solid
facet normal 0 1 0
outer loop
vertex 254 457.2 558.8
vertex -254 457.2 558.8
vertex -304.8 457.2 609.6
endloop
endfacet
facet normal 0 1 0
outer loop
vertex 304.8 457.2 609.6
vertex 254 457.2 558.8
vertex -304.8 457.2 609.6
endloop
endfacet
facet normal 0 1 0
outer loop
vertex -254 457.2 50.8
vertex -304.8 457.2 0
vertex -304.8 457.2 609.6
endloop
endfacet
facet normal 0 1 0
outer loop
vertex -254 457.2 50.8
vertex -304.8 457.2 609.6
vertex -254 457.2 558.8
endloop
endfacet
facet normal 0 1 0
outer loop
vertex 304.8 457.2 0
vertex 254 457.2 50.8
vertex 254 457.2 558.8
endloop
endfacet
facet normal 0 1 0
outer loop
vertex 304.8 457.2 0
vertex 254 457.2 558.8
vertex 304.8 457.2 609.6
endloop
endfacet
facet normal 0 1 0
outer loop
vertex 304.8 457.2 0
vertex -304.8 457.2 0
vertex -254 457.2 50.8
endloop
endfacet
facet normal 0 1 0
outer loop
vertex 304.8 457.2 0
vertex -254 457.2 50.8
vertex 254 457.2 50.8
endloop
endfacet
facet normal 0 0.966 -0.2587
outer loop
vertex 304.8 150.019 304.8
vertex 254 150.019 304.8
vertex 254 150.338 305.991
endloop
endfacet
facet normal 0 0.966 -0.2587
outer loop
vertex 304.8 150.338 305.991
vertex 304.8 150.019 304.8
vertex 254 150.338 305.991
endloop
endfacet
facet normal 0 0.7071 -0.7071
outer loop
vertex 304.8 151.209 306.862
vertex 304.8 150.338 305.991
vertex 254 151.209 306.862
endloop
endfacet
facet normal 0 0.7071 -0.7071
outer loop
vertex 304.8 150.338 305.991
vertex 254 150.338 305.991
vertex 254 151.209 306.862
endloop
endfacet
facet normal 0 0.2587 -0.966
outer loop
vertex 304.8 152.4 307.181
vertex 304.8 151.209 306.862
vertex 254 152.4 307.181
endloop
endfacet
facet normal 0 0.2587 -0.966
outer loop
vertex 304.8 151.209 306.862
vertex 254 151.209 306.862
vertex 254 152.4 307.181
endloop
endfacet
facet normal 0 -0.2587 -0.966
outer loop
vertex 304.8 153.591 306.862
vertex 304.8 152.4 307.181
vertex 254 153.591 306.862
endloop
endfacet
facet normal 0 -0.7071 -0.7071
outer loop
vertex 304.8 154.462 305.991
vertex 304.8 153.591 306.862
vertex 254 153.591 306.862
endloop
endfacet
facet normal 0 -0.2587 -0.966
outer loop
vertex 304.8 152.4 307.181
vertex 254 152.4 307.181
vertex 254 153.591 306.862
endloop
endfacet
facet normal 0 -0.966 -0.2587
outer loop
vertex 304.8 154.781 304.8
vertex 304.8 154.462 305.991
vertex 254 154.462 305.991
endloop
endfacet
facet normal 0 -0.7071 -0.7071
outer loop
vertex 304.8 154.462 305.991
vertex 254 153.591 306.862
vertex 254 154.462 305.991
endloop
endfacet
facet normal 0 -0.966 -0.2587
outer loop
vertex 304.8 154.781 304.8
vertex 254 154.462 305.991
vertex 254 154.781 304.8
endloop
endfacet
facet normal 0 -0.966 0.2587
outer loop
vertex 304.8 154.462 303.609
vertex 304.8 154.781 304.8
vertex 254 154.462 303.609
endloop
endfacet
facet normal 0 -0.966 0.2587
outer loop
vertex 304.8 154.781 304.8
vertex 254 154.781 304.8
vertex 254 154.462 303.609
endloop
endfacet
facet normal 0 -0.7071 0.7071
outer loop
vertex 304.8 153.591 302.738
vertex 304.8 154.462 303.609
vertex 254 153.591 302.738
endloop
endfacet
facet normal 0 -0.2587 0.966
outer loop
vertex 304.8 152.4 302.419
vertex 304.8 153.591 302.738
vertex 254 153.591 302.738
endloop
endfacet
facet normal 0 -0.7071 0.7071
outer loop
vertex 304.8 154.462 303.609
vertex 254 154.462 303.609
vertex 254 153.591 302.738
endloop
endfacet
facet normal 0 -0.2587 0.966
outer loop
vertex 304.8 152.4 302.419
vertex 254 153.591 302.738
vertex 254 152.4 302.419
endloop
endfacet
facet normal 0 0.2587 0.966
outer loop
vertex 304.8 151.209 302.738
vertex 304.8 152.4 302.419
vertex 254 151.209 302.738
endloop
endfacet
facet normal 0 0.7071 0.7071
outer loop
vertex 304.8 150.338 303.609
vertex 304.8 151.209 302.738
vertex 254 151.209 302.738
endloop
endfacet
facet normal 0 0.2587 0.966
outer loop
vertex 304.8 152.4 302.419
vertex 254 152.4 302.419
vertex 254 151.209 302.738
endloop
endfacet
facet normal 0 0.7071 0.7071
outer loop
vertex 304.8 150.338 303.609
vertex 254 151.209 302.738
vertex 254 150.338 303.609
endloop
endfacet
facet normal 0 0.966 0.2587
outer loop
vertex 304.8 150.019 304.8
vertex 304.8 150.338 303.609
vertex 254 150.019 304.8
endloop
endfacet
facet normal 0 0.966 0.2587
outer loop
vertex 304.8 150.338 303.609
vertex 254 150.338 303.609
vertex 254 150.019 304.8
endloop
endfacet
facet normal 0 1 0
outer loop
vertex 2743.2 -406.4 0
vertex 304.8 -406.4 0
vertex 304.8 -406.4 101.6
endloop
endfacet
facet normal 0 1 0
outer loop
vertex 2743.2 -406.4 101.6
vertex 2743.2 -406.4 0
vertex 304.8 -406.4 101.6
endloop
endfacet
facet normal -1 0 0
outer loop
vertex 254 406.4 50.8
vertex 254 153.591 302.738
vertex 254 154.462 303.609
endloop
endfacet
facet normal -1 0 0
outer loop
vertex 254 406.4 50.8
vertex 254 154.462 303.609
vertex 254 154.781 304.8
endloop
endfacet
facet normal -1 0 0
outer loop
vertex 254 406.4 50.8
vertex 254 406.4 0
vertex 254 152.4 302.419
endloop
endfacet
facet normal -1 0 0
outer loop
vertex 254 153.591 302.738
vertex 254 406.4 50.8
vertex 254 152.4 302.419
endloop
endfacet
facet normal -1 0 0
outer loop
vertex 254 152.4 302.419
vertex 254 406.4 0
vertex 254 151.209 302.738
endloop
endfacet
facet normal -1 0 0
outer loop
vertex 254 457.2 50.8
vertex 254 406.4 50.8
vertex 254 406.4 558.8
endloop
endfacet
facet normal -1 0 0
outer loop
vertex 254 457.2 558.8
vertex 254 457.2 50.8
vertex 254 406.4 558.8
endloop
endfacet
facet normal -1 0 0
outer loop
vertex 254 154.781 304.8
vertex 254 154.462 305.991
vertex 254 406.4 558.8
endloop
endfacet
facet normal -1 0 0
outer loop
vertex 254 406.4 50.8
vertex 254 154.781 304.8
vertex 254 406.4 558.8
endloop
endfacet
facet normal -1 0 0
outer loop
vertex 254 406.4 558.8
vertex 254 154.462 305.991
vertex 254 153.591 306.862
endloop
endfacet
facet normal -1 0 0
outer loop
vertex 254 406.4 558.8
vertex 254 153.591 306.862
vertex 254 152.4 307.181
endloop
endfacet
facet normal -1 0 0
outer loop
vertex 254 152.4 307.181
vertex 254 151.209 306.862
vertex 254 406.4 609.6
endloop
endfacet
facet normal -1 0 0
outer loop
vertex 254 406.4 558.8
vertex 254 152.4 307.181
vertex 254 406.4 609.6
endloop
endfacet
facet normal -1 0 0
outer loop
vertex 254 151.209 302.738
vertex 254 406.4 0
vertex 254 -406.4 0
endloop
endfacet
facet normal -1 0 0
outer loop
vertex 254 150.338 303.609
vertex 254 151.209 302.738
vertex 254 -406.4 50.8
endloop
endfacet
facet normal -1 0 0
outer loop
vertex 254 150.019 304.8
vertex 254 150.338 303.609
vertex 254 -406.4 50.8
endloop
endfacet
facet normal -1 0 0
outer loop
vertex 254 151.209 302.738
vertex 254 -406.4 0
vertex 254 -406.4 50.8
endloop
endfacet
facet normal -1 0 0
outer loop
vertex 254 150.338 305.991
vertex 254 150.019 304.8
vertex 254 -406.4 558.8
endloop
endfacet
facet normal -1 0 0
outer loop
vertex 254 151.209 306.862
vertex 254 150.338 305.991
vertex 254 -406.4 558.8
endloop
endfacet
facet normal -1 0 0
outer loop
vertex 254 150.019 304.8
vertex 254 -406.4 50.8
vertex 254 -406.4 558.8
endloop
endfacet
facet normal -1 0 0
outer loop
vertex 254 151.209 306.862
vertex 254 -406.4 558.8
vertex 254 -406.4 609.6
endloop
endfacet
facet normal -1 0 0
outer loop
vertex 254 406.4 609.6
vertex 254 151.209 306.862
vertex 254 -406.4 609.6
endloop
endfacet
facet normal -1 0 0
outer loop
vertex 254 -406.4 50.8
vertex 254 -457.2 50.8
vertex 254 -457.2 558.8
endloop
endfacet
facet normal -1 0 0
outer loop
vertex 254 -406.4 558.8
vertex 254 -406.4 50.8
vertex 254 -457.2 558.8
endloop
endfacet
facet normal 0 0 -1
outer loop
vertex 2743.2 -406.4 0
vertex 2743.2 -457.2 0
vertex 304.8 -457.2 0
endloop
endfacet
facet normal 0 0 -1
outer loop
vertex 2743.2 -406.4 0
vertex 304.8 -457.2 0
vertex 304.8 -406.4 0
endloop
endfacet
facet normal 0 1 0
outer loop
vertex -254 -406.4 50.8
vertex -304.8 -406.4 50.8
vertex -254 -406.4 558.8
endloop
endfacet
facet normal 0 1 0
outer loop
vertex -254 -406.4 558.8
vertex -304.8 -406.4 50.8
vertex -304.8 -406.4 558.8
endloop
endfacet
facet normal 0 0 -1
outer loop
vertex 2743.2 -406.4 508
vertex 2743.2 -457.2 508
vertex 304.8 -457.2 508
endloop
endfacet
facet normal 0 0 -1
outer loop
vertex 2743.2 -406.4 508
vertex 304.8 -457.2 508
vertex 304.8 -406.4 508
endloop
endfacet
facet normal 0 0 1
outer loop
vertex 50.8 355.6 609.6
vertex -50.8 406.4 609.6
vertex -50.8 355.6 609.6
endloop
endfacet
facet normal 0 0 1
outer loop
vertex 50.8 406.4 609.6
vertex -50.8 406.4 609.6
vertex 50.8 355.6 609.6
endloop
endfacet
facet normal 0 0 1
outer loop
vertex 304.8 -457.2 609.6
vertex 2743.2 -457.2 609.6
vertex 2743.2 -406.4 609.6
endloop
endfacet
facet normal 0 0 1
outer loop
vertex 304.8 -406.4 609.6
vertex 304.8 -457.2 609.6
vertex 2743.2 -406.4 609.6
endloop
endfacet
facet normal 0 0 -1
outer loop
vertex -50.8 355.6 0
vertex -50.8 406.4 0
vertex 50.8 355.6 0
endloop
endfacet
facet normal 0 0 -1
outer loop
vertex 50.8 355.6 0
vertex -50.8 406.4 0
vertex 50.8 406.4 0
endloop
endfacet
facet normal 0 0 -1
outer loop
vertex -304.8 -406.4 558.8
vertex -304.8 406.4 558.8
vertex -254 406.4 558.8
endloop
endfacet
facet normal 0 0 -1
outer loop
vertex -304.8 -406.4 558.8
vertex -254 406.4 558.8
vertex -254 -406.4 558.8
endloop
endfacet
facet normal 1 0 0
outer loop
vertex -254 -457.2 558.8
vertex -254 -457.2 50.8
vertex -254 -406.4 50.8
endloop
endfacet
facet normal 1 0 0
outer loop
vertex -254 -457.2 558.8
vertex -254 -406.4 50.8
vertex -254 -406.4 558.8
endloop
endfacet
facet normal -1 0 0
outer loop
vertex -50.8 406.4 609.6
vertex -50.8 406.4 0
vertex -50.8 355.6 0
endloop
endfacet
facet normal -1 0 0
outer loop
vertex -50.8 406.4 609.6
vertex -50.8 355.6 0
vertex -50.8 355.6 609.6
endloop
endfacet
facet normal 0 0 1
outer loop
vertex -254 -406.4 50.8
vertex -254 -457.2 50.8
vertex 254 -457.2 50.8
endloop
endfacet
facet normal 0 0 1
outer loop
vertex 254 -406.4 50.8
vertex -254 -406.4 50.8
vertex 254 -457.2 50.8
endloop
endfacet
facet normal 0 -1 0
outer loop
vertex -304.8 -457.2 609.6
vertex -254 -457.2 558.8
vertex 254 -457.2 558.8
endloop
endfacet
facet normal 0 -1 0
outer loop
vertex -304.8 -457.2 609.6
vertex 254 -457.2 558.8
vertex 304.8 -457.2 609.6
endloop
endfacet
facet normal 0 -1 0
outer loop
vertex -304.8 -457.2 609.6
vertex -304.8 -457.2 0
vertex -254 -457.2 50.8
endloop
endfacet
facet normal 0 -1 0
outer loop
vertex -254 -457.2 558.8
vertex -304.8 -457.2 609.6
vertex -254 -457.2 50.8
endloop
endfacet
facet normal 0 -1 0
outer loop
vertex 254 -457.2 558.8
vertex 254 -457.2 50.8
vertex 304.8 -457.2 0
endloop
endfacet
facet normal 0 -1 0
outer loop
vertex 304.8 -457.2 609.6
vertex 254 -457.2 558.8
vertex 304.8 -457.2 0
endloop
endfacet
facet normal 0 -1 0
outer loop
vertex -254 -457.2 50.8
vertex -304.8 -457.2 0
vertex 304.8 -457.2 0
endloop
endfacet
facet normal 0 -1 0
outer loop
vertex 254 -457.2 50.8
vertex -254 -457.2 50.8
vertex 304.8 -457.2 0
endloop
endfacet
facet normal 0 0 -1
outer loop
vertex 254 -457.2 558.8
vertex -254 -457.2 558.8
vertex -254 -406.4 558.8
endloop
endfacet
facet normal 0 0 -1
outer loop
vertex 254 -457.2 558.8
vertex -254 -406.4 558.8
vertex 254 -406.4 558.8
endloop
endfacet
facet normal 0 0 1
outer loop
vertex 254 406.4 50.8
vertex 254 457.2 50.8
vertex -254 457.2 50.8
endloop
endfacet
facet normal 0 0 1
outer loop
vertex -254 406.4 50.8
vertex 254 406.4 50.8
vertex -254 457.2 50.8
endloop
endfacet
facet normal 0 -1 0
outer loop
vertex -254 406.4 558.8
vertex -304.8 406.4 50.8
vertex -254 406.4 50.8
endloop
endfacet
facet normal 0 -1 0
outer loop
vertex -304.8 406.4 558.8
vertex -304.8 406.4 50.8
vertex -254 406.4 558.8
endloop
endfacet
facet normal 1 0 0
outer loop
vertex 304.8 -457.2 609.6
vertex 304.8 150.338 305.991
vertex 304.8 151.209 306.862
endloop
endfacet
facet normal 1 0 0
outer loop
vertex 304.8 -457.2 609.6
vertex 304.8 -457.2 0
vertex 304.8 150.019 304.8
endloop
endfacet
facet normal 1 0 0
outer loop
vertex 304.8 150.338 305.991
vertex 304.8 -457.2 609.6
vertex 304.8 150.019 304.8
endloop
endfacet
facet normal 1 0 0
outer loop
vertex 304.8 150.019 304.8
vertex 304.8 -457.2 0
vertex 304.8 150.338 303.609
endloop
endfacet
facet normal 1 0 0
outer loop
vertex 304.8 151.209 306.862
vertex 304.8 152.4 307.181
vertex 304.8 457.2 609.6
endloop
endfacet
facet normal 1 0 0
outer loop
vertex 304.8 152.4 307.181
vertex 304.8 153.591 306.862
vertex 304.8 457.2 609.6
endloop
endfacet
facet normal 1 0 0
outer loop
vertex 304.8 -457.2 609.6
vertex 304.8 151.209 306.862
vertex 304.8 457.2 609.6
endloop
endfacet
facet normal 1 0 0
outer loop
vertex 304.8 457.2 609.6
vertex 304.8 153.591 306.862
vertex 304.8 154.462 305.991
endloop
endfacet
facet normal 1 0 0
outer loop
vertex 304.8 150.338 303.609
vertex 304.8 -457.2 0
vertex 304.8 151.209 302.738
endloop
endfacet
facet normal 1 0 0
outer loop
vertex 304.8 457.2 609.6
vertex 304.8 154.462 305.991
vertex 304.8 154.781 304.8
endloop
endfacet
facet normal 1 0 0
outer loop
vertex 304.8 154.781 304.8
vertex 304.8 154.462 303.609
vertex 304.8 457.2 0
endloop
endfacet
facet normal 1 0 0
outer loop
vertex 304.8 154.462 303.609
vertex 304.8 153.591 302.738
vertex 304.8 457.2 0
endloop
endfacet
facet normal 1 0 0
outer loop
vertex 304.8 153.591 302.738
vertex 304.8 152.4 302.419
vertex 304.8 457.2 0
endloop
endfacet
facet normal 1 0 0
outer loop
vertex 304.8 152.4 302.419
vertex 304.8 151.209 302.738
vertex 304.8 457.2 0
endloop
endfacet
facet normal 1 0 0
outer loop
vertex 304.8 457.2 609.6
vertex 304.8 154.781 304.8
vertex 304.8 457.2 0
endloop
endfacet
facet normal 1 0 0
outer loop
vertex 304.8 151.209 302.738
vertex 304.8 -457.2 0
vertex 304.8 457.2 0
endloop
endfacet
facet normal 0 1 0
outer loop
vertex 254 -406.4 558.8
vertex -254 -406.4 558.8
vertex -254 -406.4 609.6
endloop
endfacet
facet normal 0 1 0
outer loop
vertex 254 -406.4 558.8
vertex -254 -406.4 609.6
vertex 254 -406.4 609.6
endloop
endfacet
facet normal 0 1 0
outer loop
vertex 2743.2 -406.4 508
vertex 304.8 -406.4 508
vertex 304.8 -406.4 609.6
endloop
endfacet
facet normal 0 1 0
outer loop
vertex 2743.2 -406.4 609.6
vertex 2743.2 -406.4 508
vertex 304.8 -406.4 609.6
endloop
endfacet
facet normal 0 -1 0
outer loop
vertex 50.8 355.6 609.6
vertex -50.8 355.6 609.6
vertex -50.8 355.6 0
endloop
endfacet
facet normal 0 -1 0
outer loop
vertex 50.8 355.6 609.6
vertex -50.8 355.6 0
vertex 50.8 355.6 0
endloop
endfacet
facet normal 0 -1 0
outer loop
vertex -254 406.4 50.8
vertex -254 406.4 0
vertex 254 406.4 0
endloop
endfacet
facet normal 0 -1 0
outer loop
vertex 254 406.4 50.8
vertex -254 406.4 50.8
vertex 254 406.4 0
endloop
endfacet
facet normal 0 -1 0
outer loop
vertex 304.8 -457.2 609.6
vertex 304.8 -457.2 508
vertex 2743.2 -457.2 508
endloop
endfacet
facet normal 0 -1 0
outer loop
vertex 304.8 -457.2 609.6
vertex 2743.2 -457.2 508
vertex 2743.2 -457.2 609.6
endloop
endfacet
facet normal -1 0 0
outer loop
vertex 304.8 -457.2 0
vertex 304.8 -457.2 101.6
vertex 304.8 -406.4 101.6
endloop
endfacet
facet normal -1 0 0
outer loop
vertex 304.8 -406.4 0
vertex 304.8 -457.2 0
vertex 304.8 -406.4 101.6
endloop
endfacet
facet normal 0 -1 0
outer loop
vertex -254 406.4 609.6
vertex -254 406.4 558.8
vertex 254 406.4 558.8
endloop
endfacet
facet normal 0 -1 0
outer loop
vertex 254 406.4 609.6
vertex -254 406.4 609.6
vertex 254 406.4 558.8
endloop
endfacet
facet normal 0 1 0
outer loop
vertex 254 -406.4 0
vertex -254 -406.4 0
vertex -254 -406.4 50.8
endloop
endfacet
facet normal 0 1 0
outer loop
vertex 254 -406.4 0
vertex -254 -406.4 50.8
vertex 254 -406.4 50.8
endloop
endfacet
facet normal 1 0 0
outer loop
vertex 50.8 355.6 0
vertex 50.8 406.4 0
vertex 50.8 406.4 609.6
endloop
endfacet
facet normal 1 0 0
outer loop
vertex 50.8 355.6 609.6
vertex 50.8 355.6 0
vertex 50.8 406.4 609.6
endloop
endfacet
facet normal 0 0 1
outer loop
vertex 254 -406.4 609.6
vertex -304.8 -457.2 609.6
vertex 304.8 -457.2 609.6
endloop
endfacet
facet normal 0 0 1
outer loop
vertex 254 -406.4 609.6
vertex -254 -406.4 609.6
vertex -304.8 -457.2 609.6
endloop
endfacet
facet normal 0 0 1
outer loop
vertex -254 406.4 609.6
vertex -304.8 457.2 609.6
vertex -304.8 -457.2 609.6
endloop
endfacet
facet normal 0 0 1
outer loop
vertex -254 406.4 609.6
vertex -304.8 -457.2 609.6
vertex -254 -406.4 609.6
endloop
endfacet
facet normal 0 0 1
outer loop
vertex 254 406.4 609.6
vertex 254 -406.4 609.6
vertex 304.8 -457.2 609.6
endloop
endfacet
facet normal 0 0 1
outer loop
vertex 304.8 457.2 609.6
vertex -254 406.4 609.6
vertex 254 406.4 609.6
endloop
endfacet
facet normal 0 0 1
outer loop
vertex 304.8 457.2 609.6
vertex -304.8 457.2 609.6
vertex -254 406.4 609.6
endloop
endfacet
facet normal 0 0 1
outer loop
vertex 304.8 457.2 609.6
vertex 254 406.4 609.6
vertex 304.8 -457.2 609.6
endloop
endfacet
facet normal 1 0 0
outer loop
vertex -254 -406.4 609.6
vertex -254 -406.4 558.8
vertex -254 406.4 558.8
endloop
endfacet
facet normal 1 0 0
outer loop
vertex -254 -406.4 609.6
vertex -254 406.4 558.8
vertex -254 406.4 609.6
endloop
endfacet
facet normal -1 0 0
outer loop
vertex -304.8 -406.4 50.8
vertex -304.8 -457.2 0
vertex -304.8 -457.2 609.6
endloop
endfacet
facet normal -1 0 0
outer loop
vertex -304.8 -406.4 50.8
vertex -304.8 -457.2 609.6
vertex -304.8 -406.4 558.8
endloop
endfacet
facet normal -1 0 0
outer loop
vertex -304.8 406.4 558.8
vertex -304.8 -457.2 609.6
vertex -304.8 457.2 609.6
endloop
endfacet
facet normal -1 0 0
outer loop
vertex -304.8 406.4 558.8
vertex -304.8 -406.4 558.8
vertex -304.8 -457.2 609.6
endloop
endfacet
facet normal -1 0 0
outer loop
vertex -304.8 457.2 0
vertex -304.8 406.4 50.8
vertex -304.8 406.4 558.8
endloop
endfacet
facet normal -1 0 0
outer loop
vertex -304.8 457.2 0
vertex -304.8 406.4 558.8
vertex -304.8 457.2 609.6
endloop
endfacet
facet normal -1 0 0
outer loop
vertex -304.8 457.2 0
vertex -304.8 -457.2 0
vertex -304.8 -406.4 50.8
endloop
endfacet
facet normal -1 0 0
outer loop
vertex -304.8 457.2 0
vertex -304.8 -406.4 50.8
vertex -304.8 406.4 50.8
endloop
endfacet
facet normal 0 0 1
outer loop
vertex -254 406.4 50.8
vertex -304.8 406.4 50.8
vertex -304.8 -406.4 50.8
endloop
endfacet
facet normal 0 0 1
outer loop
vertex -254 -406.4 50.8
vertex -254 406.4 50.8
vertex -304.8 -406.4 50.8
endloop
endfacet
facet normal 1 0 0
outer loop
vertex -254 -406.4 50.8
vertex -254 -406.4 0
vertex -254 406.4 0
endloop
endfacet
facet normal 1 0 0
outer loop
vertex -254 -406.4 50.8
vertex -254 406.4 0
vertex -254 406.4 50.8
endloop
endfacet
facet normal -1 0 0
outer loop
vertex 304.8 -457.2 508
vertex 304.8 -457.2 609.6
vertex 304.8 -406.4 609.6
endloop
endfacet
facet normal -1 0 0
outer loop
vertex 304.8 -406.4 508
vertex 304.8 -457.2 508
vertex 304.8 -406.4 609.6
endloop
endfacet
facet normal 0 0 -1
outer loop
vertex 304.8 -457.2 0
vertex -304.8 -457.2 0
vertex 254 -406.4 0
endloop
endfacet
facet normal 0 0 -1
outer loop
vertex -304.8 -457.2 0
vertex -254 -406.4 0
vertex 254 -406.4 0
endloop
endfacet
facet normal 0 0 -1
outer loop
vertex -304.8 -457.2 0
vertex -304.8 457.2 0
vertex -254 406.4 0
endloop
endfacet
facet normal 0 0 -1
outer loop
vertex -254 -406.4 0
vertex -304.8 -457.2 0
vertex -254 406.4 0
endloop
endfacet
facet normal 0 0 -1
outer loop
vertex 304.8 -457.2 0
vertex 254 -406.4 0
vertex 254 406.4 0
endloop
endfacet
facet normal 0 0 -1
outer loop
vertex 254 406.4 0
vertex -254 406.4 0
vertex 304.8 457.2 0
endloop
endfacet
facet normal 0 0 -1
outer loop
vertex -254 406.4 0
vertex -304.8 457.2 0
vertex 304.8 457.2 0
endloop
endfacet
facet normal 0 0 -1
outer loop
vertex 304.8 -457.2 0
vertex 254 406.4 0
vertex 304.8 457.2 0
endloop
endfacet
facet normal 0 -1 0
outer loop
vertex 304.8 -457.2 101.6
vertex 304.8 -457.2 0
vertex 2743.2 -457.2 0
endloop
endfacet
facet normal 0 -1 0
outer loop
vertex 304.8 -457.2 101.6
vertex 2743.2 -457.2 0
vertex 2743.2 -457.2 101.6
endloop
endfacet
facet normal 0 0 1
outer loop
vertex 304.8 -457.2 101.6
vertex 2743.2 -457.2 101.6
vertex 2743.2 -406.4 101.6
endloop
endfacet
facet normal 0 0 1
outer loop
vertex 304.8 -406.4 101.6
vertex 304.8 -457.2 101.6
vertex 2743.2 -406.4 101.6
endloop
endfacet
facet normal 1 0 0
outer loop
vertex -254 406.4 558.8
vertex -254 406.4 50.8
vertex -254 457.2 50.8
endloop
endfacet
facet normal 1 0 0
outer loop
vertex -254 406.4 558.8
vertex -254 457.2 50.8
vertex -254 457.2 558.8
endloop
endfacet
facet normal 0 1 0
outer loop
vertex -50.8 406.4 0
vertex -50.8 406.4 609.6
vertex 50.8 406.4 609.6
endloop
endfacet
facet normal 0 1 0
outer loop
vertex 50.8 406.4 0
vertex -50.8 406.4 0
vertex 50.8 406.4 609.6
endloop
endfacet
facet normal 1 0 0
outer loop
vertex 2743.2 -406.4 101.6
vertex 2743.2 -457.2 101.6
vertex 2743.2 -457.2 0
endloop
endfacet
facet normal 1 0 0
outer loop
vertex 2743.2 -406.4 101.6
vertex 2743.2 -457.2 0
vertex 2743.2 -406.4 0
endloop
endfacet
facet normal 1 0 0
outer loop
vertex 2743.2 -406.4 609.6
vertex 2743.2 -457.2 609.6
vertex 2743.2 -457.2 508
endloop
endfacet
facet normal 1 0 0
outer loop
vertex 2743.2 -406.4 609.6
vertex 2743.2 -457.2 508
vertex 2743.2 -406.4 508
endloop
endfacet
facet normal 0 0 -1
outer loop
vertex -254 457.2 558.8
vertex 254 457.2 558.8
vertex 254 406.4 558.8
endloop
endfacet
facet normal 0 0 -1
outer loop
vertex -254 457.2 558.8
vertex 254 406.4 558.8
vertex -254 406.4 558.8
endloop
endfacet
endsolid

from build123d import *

# Parameters (mm, degrees)
F0_W      = 609.6
F0_H      = 914.4
F0_W_2    = 508
F0_H_2    = 812.8
F1_DEPTH  = 609.6
F2_W      = 508
F2_H      = 508
F3_DEPTH  = 50.8
F4_W      = 508
F4_H      = 508
F5_DEPTH  = 50.8
F6_W      = 812.8
F6_H      = 508
F7_DEPTH  = 50.8
F8_W      = 50.8
F8_H      = 101.6
F9_DEPTH  = 2438.4
F10_D     = 4.7625
F11_W     = 101.6
F11_H     = 609.6
F12_DEPTH = 50.8


with BuildPart() as f1:
    # F0 (on Top) → F1 (new body)
    with BuildSketch(Plane.XY):
        Rectangle(F0_W, F0_H)
        Rectangle(F0_W_2, F0_H_2, mode=Mode.SUBTRACT)
    extrude(amount=F1_DEPTH)

    # F2 (on face) → F3 (cut)
    with BuildSketch(Plane.XZ.offset(457.2)):
        with Locations((0, 304.8)):
            Rectangle(F2_W, F2_H)
    extrude(amount=-F3_DEPTH, mode=Mode.SUBTRACT)

    # F4 (on face) → F5 (cut)
    with BuildSketch(Plane(origin=(0, 457.2, 0), x_dir=(-1, 0, 0), z_dir=(0, 1, 0))):
        with Locations((0, 304.8)):
            Rectangle(F4_W, F4_H)
    extrude(amount=-F5_DEPTH, mode=Mode.SUBTRACT)

    # F6 (on face) → F7 (cut)
    with BuildSketch(Plane(origin=(-304.8, 0, 0), x_dir=(0, -1, 0), z_dir=(-1, 0, 0))):
        with Locations((0, 304.8)):
            Rectangle(F6_W, F6_H)
    extrude(amount=-F7_DEPTH, mode=Mode.SUBTRACT)

    # F10 (through all)
    with Locations(Plane.YZ.offset(304.8)):
        with Locations((152.4, 304.8)):
            Hole(F10_D / 2)


with BuildPart() as f9:
    # F8 (on face) → F9 (new body)
    with BuildSketch(Plane.YZ.offset(304.8)):
        with Locations((-431.8, 558.8)):
            Rectangle(F8_W, F8_H)
        with Locations((-431.8, 50.8)):
            Rectangle(F8_W, F8_H)
    extrude(amount=F9_DEPTH)


with BuildPart() as f12:
    # F11 (on face) → F12 (new body)
    with BuildSketch(Plane.XZ.offset(-406.4)):
        with Locations((0, 304.8)):
            Rectangle(F11_W, F11_H)
    extrude(amount=F12_DEPTH)


solid = Compound([f1.part, f9.part, f12.part])
